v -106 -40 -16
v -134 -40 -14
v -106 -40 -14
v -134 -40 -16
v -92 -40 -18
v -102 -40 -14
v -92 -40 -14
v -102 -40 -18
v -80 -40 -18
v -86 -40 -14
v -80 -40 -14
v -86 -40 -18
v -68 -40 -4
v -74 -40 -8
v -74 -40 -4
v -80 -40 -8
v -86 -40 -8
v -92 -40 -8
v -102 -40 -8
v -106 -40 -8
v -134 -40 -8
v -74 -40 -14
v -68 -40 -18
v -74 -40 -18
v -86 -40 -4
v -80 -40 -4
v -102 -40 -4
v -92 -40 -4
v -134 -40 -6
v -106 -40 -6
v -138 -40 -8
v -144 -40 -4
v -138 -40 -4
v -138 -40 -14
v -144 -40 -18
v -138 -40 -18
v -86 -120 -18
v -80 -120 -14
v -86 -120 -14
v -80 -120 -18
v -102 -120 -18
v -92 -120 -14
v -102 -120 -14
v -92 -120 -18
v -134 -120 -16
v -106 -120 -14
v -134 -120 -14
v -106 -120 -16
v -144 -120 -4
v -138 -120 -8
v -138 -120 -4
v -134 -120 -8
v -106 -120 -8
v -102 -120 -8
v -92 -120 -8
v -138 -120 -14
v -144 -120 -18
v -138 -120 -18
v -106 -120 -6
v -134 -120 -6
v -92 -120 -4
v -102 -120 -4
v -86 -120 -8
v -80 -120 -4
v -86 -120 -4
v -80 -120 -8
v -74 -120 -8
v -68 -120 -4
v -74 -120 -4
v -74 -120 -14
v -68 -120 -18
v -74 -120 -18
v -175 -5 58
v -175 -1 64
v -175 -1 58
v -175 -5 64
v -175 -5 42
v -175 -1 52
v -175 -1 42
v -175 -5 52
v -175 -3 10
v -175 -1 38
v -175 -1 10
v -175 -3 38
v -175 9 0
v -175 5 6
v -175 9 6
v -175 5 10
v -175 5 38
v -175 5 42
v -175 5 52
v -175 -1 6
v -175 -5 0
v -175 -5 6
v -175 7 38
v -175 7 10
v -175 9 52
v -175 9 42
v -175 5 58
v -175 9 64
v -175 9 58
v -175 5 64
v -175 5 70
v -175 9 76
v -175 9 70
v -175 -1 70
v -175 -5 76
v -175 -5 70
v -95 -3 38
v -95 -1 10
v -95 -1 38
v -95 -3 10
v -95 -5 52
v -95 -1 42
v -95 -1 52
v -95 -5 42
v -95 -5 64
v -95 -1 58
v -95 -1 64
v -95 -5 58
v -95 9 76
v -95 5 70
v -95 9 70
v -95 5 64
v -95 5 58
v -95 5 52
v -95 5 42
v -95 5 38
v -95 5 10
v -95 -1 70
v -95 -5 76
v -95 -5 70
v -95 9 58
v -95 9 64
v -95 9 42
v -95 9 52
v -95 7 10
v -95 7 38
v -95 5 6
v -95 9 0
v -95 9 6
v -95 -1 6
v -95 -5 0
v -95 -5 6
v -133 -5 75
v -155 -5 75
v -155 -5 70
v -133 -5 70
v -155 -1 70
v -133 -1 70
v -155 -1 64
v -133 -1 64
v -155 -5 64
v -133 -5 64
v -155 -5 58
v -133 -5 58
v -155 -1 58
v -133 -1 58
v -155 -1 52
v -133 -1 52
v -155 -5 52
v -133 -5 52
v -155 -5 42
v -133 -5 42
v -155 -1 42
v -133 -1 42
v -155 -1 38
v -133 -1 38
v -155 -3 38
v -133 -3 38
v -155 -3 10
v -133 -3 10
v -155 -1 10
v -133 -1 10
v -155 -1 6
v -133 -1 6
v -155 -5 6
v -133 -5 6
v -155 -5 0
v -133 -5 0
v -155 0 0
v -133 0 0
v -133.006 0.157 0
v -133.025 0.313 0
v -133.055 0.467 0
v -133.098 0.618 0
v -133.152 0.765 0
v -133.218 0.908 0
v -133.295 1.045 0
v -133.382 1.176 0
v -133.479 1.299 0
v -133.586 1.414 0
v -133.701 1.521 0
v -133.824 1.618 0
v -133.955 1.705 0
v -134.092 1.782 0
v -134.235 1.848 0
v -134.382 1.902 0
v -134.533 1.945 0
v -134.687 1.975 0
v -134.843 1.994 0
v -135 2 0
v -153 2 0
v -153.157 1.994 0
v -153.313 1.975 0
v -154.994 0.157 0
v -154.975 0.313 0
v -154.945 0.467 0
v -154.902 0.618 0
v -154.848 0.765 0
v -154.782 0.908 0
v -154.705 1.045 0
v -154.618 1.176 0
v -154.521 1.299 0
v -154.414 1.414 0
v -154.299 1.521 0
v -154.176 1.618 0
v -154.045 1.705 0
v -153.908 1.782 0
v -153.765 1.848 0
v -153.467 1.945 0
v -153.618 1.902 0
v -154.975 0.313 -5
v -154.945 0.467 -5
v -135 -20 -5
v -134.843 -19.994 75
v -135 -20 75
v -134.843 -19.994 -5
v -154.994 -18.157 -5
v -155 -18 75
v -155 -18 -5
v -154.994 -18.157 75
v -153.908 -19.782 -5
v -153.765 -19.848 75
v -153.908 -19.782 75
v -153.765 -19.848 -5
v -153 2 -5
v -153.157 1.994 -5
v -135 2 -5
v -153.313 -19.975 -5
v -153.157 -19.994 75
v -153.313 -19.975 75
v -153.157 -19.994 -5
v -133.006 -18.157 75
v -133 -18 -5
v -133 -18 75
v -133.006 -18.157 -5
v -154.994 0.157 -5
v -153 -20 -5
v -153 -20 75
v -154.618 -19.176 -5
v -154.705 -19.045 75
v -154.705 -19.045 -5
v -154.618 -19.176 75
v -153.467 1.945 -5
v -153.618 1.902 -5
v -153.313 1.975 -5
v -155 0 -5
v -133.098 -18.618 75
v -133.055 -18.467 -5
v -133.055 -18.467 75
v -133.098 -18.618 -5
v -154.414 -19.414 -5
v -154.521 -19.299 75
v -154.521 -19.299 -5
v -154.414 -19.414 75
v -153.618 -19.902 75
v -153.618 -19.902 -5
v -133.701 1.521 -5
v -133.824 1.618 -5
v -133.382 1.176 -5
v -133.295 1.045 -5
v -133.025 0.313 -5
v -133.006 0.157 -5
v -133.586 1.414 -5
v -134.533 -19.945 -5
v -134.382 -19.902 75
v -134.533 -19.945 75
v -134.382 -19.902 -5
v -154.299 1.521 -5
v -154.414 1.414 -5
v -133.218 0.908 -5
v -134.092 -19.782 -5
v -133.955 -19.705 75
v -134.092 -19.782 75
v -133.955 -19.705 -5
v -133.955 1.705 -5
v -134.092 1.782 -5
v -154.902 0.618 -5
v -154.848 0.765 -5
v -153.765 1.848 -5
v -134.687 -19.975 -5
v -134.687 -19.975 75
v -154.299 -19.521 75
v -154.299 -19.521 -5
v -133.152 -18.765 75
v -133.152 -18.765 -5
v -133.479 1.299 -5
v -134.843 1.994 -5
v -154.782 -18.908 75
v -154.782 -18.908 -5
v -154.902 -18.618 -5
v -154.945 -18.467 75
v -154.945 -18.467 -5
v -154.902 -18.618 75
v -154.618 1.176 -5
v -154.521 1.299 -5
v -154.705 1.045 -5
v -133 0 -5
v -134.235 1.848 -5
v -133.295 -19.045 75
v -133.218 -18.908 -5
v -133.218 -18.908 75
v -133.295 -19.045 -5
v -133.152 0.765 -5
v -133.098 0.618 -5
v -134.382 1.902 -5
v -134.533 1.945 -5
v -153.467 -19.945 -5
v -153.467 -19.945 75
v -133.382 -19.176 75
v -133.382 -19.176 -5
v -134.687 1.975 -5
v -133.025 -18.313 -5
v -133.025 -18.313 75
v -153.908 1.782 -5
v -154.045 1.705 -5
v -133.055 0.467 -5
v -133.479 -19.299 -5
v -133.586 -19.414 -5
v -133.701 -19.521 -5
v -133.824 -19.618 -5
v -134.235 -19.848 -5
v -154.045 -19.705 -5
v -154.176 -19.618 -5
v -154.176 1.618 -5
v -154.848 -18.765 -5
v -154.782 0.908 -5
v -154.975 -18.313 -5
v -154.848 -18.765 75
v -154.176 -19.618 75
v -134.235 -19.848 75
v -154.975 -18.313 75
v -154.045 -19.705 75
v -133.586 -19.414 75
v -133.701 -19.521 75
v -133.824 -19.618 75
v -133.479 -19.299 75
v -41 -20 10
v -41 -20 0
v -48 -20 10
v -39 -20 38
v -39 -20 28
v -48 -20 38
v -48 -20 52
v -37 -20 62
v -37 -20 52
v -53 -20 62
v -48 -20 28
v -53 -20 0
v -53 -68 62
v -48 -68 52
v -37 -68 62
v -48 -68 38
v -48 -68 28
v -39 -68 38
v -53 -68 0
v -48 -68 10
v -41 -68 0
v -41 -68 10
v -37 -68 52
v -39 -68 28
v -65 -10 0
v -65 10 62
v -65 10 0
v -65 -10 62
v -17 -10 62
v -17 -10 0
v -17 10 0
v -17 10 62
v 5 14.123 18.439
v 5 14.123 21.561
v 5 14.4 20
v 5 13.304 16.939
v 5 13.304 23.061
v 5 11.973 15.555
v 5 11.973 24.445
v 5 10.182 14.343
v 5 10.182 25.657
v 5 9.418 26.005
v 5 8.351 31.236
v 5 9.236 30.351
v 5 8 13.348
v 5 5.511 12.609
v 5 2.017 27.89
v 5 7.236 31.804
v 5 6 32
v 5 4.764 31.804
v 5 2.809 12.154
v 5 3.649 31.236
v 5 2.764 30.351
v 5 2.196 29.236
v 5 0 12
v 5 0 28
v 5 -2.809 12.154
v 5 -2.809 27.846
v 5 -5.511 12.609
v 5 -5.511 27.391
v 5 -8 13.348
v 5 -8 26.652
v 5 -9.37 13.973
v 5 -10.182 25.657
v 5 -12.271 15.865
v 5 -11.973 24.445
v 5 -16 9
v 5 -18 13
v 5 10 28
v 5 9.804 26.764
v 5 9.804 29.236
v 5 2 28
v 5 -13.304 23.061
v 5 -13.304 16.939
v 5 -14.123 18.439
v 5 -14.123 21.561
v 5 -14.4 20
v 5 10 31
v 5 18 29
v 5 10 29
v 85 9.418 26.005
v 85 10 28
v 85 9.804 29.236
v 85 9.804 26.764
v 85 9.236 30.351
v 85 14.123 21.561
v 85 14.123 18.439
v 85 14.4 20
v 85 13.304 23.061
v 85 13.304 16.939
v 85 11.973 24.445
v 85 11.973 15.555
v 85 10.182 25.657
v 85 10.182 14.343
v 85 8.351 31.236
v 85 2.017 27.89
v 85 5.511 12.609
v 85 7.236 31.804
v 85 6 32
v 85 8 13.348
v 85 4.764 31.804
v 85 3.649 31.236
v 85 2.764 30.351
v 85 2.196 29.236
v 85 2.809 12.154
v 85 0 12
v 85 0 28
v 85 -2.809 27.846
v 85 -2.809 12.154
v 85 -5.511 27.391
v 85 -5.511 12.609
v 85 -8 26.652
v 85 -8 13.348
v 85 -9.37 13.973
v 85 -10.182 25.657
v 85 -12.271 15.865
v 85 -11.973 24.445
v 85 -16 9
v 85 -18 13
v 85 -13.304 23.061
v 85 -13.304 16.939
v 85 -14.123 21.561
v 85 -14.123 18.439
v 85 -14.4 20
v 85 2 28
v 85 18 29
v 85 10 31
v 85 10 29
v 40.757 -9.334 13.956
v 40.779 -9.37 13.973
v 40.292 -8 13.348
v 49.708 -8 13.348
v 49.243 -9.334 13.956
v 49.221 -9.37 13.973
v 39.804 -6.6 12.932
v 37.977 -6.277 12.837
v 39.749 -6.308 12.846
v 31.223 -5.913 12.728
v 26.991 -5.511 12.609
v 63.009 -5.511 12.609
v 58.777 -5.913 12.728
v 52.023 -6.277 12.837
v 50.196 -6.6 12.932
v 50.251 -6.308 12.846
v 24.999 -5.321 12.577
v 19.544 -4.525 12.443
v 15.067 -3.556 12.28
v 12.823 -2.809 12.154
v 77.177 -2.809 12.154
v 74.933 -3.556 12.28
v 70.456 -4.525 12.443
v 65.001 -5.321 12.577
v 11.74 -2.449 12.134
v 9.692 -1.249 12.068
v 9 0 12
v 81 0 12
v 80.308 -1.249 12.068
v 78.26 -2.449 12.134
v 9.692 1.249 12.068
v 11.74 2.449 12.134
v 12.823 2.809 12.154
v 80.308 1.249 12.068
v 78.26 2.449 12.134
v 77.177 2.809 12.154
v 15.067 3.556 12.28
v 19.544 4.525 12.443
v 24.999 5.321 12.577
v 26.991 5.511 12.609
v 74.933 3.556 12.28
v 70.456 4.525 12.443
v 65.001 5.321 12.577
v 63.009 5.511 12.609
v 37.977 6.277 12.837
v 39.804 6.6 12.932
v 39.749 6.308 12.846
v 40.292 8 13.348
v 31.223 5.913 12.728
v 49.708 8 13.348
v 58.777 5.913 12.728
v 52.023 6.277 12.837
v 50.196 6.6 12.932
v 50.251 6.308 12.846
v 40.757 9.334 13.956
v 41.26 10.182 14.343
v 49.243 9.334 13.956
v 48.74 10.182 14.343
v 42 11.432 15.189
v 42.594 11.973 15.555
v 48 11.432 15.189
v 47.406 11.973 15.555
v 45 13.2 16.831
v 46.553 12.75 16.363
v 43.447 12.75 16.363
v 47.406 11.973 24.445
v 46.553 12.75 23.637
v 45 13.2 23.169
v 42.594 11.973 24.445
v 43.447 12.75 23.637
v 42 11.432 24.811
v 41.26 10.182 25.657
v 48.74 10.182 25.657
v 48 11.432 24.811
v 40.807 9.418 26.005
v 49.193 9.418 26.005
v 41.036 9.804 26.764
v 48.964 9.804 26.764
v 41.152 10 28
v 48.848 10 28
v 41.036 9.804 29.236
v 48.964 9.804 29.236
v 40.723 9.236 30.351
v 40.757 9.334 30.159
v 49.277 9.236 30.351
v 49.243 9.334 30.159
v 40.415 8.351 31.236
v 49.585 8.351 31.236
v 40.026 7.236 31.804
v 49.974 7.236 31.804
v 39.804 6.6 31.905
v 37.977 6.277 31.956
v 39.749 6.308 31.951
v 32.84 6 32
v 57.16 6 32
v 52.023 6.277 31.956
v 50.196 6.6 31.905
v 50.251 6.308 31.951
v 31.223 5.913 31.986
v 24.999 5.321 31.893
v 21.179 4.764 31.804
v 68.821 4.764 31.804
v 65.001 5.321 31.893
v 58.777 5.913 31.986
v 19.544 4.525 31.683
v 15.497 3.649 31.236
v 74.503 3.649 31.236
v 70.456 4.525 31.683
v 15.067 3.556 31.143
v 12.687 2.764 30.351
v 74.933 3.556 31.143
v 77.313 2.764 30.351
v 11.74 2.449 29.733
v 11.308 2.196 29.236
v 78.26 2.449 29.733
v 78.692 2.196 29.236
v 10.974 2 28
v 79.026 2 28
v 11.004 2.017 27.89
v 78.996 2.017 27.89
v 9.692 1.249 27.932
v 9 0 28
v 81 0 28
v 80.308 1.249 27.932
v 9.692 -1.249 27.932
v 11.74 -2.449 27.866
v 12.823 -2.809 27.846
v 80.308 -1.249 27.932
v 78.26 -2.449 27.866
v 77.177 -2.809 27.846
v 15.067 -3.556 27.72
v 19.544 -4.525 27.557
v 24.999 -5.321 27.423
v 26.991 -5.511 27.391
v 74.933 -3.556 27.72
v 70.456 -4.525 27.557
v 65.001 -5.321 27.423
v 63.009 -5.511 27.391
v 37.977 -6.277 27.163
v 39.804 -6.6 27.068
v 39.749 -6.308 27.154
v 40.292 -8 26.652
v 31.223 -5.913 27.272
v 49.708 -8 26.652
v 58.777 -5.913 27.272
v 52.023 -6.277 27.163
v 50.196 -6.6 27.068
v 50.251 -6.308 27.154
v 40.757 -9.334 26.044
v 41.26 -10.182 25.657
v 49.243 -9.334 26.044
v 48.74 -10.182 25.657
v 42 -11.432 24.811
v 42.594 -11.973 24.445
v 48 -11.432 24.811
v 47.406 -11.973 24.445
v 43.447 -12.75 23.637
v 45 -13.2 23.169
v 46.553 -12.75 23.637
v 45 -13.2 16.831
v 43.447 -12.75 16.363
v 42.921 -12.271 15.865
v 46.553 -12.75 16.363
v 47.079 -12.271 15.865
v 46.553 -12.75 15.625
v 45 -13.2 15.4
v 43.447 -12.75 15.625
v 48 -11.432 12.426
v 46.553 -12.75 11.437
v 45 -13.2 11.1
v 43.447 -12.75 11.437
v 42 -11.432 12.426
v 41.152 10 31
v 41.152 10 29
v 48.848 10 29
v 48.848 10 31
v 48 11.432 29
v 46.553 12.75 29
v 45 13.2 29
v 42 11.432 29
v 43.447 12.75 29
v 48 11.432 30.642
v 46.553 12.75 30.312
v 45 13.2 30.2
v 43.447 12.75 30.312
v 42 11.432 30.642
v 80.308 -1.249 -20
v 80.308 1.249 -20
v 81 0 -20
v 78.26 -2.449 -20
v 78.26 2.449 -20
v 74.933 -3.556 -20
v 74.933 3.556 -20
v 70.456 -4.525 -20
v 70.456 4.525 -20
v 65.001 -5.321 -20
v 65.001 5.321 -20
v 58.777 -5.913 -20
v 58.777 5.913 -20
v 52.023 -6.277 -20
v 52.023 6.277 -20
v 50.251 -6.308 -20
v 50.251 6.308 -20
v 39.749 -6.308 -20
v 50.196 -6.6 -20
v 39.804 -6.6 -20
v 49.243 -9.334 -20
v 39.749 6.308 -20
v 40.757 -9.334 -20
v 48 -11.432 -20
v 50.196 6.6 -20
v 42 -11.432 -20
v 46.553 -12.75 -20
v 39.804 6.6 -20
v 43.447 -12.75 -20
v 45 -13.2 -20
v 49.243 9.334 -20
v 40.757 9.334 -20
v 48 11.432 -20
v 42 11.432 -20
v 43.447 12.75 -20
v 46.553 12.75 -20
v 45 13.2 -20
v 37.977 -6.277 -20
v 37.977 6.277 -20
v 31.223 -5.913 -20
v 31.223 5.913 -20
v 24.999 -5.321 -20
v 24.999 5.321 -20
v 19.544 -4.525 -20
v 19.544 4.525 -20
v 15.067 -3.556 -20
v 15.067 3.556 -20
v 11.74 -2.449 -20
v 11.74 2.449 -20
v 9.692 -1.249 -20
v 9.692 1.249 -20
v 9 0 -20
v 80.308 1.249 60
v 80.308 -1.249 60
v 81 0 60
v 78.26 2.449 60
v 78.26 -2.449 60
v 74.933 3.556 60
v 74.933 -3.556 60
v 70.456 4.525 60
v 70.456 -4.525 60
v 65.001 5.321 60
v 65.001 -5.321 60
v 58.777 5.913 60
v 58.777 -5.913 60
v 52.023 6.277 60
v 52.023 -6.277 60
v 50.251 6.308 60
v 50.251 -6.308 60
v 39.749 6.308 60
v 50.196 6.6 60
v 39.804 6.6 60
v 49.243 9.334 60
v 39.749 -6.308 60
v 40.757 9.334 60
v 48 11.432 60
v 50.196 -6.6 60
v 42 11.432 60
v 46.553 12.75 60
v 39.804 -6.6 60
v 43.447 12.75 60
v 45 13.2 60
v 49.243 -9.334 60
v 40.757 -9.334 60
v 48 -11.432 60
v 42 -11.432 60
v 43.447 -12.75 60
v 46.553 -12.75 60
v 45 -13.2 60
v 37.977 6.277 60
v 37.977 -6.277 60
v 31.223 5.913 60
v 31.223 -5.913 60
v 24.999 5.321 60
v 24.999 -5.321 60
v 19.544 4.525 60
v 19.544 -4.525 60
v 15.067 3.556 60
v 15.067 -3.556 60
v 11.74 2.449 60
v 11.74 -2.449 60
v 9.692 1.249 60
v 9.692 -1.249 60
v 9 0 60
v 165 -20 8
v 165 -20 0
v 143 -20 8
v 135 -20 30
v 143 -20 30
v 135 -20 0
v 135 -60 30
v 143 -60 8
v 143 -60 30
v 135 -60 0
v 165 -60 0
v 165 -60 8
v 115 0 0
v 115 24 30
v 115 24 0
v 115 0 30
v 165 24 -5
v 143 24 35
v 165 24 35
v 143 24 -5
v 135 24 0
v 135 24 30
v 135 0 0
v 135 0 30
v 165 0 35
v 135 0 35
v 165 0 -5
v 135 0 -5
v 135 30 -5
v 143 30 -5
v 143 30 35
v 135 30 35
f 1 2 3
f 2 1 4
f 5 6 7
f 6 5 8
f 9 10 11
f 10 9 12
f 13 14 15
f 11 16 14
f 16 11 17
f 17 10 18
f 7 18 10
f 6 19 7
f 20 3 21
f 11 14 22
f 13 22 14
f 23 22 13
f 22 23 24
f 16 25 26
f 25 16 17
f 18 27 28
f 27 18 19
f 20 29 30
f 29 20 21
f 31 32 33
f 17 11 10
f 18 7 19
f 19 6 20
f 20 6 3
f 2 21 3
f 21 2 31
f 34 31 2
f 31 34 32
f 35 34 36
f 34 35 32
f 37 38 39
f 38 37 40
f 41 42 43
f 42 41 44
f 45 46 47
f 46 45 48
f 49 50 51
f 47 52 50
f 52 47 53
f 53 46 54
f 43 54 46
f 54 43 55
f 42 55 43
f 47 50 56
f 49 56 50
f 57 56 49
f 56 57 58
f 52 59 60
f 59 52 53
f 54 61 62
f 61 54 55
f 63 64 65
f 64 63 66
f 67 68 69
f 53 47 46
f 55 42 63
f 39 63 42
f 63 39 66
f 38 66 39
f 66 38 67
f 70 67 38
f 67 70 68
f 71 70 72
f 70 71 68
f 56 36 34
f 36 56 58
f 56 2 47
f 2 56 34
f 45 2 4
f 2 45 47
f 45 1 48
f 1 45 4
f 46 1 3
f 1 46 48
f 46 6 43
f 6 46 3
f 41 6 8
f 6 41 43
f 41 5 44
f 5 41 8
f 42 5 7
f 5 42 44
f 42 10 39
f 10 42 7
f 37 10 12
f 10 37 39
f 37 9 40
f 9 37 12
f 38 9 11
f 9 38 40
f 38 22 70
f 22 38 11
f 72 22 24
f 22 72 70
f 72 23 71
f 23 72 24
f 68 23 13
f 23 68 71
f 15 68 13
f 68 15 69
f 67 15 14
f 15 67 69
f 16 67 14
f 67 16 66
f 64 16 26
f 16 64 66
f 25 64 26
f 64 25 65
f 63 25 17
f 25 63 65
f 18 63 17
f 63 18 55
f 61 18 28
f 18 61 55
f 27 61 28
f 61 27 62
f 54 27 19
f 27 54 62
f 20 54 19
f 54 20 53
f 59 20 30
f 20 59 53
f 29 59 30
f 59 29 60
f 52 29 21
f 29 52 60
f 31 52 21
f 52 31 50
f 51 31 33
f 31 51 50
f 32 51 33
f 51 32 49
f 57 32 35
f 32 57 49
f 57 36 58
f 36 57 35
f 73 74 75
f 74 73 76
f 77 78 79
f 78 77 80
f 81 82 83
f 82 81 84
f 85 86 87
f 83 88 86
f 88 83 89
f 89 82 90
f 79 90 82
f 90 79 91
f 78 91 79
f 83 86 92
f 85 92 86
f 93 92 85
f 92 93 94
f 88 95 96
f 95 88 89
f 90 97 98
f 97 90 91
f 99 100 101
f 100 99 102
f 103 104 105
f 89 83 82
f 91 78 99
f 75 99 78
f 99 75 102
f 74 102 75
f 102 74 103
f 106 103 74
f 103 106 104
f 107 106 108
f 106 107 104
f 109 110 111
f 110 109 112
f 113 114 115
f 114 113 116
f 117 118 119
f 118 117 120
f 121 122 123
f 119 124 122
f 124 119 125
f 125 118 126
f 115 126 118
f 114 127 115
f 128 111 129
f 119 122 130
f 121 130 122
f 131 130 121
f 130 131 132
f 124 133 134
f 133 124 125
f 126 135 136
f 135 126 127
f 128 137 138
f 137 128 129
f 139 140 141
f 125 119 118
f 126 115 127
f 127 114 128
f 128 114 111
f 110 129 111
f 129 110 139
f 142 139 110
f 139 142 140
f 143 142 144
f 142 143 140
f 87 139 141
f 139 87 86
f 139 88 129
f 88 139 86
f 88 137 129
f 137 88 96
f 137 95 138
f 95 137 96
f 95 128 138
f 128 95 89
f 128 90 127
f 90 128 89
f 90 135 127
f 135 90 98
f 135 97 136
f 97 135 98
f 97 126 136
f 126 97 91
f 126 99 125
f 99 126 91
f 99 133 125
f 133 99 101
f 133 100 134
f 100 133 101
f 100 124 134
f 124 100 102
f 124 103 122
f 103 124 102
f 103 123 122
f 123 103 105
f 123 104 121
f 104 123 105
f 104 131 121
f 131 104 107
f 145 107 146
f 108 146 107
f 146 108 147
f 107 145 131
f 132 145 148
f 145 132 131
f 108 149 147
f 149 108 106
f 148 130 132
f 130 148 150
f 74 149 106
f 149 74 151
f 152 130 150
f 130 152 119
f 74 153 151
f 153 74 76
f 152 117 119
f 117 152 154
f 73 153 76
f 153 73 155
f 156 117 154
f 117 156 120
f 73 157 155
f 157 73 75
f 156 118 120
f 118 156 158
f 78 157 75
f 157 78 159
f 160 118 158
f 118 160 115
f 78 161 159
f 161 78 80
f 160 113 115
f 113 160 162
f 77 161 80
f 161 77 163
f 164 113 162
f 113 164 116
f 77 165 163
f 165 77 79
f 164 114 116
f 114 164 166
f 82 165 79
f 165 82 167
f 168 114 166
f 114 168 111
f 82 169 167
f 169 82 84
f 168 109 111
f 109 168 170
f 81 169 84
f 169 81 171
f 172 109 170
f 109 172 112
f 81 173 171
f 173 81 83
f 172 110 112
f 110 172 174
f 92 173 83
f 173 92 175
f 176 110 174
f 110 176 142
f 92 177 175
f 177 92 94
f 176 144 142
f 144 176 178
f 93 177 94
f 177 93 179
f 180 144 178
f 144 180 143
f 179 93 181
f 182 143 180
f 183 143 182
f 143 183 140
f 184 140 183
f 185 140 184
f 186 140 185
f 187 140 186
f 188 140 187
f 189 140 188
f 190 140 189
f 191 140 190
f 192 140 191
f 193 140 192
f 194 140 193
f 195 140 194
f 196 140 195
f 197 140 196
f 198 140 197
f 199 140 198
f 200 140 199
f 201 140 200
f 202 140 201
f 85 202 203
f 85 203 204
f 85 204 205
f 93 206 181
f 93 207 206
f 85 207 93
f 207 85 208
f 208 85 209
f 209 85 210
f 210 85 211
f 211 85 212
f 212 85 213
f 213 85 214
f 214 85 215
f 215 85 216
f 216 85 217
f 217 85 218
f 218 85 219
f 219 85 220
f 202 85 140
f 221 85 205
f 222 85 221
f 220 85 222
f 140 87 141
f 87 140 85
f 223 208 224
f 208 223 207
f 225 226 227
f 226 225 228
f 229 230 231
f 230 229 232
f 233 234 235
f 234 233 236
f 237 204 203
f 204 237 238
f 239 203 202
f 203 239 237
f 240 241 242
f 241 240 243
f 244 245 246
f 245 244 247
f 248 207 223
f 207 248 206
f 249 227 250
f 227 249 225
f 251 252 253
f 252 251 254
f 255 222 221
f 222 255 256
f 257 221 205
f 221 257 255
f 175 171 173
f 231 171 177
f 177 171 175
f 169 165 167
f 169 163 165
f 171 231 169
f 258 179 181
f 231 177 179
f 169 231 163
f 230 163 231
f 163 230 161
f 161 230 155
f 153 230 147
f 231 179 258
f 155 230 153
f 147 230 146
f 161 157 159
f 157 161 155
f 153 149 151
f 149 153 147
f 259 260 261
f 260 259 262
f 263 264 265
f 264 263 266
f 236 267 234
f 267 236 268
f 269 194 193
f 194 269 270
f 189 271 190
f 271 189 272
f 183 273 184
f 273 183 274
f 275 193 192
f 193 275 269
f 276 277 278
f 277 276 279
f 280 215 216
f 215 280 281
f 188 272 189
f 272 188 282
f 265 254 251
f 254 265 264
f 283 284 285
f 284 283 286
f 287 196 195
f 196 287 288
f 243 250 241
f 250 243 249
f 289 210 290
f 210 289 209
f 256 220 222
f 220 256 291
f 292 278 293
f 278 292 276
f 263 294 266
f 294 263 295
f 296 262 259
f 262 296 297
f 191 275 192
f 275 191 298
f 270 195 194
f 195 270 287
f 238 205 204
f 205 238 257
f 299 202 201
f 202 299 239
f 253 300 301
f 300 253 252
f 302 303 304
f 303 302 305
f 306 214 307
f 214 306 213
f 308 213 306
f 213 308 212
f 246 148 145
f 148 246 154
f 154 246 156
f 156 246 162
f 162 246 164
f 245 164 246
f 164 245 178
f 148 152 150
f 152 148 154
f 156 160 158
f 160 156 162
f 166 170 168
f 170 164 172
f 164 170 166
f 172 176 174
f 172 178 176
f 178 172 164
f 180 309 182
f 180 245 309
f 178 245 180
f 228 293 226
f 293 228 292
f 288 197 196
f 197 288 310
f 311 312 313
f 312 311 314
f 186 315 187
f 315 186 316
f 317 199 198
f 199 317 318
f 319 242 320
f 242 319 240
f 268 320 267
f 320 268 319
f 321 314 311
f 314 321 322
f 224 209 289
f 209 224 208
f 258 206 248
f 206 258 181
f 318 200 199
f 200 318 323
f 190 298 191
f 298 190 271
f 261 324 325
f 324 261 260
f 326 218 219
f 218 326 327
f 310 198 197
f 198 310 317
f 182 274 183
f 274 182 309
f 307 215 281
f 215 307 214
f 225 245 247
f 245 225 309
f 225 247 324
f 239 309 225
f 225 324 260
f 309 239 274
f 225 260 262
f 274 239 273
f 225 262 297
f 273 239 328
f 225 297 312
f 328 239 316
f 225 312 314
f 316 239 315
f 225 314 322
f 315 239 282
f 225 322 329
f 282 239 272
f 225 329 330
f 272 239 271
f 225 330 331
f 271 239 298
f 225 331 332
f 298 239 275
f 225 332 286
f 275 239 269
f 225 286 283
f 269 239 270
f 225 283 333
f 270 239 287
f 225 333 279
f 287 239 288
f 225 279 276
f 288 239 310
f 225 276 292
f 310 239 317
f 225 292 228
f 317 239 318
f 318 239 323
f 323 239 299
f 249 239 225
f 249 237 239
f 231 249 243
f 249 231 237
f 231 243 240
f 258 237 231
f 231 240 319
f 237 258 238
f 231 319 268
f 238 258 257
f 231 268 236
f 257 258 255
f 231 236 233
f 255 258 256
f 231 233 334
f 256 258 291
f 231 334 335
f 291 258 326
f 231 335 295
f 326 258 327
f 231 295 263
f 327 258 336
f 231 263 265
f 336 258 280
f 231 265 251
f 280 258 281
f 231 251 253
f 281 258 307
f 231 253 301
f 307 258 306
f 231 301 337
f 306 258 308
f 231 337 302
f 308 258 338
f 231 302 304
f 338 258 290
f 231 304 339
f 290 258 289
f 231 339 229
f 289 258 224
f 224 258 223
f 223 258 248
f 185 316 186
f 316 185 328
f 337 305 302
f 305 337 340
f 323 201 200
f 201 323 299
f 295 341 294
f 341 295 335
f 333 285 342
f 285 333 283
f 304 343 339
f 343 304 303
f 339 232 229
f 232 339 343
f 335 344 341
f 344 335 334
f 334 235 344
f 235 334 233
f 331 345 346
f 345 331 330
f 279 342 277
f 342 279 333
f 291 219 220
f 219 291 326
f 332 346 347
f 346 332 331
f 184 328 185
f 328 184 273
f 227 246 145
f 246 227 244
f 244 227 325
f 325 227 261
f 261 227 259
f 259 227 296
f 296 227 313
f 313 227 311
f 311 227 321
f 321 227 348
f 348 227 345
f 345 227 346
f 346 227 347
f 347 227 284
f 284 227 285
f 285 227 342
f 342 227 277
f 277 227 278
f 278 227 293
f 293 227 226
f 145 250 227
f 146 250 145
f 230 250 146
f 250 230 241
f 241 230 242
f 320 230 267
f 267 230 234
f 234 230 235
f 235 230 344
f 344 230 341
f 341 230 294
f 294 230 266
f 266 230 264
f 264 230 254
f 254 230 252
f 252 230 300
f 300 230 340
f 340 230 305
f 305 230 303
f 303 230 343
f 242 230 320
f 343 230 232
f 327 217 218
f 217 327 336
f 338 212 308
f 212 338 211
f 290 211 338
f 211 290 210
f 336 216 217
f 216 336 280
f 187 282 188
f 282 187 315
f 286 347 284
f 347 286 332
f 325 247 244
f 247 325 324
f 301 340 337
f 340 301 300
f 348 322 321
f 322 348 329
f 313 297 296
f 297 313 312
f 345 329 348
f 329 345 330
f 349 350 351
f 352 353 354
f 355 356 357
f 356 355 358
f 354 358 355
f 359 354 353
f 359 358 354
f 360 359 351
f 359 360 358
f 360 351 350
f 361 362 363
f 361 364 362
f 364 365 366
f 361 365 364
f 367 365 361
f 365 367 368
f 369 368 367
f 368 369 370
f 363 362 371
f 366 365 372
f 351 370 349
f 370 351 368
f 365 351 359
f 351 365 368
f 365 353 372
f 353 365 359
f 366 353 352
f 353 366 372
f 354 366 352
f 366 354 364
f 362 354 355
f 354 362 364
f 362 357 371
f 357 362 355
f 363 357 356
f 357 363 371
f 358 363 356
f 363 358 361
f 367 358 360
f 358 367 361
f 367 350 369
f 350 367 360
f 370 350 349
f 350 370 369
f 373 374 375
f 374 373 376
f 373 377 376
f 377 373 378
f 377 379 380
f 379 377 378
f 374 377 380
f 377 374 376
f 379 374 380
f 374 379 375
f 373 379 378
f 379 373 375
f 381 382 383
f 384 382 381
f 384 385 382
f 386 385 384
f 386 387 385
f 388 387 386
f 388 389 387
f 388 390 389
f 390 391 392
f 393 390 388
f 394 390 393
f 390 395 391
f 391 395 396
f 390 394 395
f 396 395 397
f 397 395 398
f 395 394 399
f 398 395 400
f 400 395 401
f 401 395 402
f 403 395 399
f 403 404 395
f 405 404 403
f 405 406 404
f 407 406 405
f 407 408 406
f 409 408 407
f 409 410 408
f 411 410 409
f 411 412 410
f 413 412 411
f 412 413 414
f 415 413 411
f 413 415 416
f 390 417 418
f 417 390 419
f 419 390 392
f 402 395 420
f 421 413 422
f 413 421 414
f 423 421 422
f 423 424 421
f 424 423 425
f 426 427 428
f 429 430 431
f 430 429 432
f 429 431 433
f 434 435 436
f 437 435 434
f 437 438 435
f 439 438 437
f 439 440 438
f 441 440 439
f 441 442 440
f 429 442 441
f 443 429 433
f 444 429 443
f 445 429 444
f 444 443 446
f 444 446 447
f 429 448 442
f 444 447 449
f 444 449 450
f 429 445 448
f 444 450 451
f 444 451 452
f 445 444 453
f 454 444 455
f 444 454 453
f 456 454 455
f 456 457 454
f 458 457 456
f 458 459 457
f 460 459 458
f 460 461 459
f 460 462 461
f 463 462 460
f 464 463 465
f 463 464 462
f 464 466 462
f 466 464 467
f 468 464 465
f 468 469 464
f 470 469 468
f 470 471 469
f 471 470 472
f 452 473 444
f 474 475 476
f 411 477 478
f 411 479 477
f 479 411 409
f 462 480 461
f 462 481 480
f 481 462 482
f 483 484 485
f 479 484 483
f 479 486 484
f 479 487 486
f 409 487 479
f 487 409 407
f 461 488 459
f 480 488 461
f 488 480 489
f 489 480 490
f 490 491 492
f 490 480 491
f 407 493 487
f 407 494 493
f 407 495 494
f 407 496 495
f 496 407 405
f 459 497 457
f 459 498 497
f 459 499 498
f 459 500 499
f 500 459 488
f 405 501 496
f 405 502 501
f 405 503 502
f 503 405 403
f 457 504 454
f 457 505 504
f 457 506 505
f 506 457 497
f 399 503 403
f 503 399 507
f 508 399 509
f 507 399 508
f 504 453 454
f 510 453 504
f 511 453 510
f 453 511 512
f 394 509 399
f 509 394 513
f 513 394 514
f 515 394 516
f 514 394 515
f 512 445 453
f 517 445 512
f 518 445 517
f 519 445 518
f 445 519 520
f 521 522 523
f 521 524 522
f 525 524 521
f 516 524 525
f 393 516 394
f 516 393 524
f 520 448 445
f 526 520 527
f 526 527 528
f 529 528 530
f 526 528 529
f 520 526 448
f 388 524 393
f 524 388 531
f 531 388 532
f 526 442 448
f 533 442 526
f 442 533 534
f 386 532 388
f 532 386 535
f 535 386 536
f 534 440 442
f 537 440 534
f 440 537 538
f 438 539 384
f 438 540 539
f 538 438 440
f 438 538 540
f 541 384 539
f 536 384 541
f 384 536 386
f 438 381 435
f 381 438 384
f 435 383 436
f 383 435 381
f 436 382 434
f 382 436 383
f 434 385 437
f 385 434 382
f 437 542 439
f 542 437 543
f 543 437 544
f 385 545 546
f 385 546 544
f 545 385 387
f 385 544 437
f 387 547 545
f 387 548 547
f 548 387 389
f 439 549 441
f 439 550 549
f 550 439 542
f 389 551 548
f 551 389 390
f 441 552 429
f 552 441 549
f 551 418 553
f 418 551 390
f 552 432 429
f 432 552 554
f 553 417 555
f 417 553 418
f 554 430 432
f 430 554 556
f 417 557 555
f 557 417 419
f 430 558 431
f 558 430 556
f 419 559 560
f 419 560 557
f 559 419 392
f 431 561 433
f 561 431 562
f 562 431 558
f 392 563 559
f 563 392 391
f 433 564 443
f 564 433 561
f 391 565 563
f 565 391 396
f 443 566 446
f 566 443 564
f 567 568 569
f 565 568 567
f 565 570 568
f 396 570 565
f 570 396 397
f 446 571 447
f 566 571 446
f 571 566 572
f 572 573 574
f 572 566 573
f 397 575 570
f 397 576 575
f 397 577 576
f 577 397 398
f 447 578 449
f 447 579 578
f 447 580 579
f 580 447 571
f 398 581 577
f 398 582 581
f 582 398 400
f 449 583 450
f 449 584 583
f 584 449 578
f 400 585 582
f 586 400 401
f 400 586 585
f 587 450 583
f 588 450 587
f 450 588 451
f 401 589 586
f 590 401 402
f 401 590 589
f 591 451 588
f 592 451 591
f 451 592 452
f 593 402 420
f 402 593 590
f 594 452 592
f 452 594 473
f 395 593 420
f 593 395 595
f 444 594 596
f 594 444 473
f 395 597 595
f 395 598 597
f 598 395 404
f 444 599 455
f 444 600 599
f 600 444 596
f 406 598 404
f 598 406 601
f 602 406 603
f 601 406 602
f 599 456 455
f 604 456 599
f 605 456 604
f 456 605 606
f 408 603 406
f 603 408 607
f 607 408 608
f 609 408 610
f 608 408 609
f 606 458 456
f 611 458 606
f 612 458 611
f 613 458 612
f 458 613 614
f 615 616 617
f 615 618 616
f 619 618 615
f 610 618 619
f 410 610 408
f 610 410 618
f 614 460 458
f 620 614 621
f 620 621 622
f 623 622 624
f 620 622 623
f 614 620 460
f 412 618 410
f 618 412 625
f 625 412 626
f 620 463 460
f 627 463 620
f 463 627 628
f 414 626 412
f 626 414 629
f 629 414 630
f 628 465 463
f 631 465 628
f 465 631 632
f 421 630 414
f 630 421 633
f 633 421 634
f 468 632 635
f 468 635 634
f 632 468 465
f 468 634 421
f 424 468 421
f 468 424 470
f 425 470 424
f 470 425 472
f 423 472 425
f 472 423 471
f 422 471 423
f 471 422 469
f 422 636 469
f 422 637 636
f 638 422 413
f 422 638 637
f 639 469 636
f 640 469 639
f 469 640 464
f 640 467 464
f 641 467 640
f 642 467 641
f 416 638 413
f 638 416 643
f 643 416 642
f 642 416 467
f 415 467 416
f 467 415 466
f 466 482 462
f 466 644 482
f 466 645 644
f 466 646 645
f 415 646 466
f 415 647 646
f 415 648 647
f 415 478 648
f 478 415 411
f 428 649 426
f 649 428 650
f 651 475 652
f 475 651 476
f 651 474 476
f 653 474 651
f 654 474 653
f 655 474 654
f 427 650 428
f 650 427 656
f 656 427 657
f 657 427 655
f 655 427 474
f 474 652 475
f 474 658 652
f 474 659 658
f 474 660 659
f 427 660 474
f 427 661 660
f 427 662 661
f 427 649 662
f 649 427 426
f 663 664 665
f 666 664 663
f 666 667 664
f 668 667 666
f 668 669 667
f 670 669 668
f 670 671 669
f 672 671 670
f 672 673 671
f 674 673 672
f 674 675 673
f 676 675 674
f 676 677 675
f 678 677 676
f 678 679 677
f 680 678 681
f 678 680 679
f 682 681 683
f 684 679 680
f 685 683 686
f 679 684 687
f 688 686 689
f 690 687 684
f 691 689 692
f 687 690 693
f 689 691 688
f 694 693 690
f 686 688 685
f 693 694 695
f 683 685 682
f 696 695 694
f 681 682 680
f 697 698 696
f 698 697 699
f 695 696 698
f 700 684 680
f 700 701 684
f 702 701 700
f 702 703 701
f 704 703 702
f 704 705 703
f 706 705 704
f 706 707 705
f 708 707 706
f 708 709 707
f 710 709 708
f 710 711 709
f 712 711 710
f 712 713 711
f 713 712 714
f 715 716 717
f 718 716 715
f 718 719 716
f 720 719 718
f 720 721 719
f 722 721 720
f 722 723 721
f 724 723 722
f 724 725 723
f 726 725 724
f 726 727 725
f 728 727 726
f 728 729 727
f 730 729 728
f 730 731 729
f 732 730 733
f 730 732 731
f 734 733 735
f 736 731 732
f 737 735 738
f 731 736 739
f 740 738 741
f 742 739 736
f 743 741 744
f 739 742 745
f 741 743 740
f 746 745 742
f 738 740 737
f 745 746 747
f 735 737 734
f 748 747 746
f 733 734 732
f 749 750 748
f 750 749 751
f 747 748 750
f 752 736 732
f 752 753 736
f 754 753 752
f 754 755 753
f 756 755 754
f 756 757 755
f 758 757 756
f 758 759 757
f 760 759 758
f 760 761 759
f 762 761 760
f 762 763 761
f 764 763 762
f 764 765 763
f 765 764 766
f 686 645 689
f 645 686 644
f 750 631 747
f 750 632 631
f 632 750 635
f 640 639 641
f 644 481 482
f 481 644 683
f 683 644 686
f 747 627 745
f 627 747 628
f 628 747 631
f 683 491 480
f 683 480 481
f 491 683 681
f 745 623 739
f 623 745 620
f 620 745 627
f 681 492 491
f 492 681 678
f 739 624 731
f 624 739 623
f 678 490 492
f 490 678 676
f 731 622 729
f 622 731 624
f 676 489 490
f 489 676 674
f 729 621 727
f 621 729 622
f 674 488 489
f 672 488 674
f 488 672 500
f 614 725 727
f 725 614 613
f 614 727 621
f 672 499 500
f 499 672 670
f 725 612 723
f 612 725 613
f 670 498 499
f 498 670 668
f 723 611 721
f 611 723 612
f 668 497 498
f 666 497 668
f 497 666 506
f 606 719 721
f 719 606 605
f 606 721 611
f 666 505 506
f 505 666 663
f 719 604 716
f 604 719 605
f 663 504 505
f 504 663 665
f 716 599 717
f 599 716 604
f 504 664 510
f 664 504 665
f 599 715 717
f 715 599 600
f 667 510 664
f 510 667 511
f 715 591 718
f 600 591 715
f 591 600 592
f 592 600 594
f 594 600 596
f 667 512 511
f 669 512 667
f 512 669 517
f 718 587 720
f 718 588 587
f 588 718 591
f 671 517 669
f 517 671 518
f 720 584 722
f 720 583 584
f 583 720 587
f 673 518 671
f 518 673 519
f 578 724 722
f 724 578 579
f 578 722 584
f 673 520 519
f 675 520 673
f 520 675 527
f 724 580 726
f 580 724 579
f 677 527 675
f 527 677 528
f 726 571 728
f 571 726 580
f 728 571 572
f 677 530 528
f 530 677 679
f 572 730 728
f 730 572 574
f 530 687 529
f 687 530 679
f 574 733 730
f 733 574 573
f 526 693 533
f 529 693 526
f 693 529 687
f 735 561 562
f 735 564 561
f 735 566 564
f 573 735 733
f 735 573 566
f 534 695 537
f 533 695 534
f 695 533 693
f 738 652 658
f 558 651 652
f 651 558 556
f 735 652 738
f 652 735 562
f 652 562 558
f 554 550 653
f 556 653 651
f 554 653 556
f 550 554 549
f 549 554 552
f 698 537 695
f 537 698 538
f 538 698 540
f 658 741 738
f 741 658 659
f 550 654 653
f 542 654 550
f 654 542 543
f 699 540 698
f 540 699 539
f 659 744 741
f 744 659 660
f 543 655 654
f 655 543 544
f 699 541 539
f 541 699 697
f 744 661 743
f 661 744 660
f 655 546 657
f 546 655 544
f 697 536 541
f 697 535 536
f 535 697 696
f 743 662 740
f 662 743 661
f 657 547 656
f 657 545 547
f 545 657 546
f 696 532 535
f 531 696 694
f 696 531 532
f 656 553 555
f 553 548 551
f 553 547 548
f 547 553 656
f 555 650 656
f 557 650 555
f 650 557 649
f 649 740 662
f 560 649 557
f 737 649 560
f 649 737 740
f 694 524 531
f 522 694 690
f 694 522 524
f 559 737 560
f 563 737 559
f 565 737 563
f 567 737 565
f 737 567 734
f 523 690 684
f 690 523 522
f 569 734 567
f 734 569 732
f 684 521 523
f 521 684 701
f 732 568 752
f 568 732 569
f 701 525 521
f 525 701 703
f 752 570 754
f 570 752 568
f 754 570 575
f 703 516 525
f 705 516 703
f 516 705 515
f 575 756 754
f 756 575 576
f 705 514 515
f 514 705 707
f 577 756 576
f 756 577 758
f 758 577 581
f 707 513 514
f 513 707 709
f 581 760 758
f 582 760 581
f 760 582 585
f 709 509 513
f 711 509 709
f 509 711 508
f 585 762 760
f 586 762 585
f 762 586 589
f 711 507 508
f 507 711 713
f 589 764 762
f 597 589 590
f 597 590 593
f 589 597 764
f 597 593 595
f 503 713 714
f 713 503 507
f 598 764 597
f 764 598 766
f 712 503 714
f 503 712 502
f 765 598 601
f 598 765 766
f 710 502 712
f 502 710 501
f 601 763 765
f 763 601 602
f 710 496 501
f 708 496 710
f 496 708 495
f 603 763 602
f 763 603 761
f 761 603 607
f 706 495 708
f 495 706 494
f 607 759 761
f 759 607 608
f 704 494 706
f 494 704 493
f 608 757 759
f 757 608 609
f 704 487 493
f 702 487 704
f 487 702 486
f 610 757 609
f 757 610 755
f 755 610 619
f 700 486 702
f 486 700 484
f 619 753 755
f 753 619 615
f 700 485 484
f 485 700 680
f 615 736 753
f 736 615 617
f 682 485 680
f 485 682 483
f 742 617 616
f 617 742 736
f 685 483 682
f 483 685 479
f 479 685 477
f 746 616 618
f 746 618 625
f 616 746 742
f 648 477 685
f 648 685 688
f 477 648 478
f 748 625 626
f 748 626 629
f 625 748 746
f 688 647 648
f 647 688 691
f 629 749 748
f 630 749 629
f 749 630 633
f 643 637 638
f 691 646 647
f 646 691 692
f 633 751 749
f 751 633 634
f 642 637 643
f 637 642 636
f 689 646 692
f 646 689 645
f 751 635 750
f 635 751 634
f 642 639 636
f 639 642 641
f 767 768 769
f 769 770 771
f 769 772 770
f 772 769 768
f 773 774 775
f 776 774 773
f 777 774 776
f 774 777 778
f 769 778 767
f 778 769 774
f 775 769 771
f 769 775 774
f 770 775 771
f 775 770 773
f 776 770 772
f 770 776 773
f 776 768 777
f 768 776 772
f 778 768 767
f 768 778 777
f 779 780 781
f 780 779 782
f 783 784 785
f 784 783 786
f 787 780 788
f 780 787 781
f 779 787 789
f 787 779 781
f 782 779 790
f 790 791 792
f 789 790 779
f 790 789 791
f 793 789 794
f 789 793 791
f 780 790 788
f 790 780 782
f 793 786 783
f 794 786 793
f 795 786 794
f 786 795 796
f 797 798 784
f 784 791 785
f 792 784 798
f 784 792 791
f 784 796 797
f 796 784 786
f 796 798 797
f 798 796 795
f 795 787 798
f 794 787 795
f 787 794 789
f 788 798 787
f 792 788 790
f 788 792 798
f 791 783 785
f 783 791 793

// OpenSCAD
// ============================================================
//  PROJECT 09 — 3D Shapes from 2D Shadows
//  Portfolio Project for: Computational CAD Engineer (OpenSCAD)
//  Author: George
// ============================================================
//
//  JD SKILLS DEMONSTRATED:
//  ✔ 3D from 2D Shadows     — CORE TECHNIQUE: intersecting
//                             orthogonal extrusions of 2D silhouettes
//                             reconstructs the 3D solid whose shadows
//                             match all input profiles simultaneously
//  ✔ intersection()         — the boolean that makes it work
//  ✔ linear_extrude         — 2D shadow profiles → 3D slabs
//  ✔ rotate_extrude         — radially symmetric shadow profiles
//  ✔ 2D Objects             — polygon(), circle(), square(), text()
//  ✔ 3D Objects             — cube(), cylinder(), sphere()
//  ✔ Boolean Operations     — intersection(), difference(), union()
//  ✔ Transformations        — translate(), rotate(), mirror(), scale()
//  ✔ Special Variables      — $fn, $fa for resolution
//  ✔ Flow Control           — for loops, if/else, nested conditions
//  ✔ Lists                  — silhouette point data, object configs
//  ✔ List Comprehensions    — multi-view projection generation
//  ✔ Operators              — projection math, coordinate transforms
//  ✔ Modifier Characters    — % ghost views for shadow illustration
//  ✔ Type Test Functions    — is_num(), is_list() validation
//  ✔ Modules & Nesting      — shadow → extrusion → intersection chain
//
// ============================================================
//  THE CORE CONCEPT — "3D FROM 2D SHADOWS":
//
//  Imagine shining a light on a 3D object from three directions:
//  Front, Side, and Top. Each light casts a 2D shadow on the wall.
//  These shadows are the 2D "projections" or "silhouettes".
//
//  This project REVERSES that process:
//  Given the 2D shadows, reconstruct the 3D object.
//
//  METHOD:
//  1. Take the FRONT shadow → extrude it backward (along Y axis)
//     → creates a 3D slab matching the front silhouette
//  2. Take the SIDE shadow  → extrude it sideways (along X axis)
//     → creates a 3D slab matching the side silhouette
//  3. Take the TOP shadow   → extrude it downward (along Z axis)
//     → creates a 3D slab matching the top silhouette
//  4. INTERSECT all three slabs
//     → the overlap is the only region consistent with ALL shadows
//     → this approximates the original 3D object
//
//  This is a fundamental technique in:
//  - Computer vision (3D reconstruction from photos)
//  - CT scanning (medical imaging)
//  - AI training data generation (3D from 2D annotations)
//  - Industrial reverse engineering
// ============================================================
//  HOW TO USE:
//  Set demo_mode to select which object to reconstruct.
//  Set show_shadows = true to visualise the input 2D profiles.
//  F5 = preview, F6 = render
// ============================================================

$fn  = 80;
$fa  = 1;

// ============================================================
//  PARAMETERS
// ============================================================

// Select demo: 1=chess piece, 2=letter F, 3=animal silhouette,
//              4=mechanical bracket, 0=all four side by side
demo_mode         = 0;

// Visual aids
show_shadows      = true;   // show ghost extrusions (% modifier)
show_result       = true;   // show the intersected 3D result
show_axes         = false;  // show XYZ axis reference lines
extrude_depth     = 80;     // mm — depth of each shadow extrusion
                             // must exceed the object's extent

// ============================================================
//  COMPUTED CONSTANTS
// ============================================================
half_depth = extrude_depth / 2;

// ============================================================
//  MODULE: shadow_ghost
//  Renders the extruded shadow slab as a transparent ghost.
//  demonstrates: % modifier character — background/ghost render
//  This visually shows the INPUT to the intersection operation.
// ============================================================
module shadow_ghost(color_rgb) {
    // demonstrates: % modifier — renders transparent/ghost
    // The % modifier makes this visible but non-manifold
    // It shows the shadow slab without affecting the result
    color(color_rgb, 0.12)
    children();
}

// ============================================================
//  MODULE: axis_lines
//  Reference XYZ axes for spatial orientation.
//  demonstrates: for loop, rotate(), cylinder(), color()
// ============================================================
module axis_lines(len = 50) {
    axes = [
        [[1,0,0], [0,1,0], [0,0,1], "X"],  // X — red
        [[0,1,0], [0,0,1], [1,0,0], "Y"],  // Y — green
        [[0,0,1], [1,0,0], [0,1,0], "Z"]   // Z — blue
    ];
    // demonstrates: for loop over list
    for (i = [0 : 2]) {
        color(axes[i][0])
        rotate(i == 0 ? [0,90,0] : i == 1 ? [90,0,0] : [0,0,0])
        cylinder(r = 0.4, h = len, $fn = 8);
    }
}

// ============================================================
//  DEMO 1 — CHESS PIECE (ROOK)
//  Front and side silhouettes are identical (symmetric).
//  Top silhouette is a square with rounded corners.
//
//  demonstrates: intersection() of three extruded profiles,
//               polygon() profiles, rotate_extrude for top,
//               difference() for battlements
// ============================================================

// Front/Side shadow of a rook — stepped profile
module rook_side_profile() {
    // Rook silhouette: base → shaft → battlements
    // demonstrates: polygon() with computed points
    polygon(points = [
        // Right side, bottom to top
        [ 0,  0], [18,  0], [18,  6],   // base
        [14,  6], [14, 10], [16, 10],   // lower step
        [16, 38], [14, 38], [14, 42],   // shaft
        [18, 42], [18, 52],             // battlement base
        [14, 52], [14, 58], [18, 58],   // battlement gap
        [18, 64], [14, 64], [14, 70],   // second battlement
        [18, 70], [18, 76],             // top
        // Left side (mirror), top to bottom
        [ 4, 76], [ 4, 70], [ 8, 70],
        [ 8, 64], [ 4, 64], [ 4, 58],
        [ 8, 58], [ 8, 52], [ 4, 52],
        [ 4, 42], [ 8, 42], [ 8, 38],
        [ 6, 38], [ 6, 10], [ 8, 10],
        [ 8,  6], [ 4,  6], [ 4,  0]
    ]);
}

// Top shadow — square with chamfered corners
module rook_top_profile() {
    // demonstrates: polygon() as top-down silhouette
    offset(r = 2)
    square([18, 18], center = true);
}

module demo_1_rook() {
    // demonstrates: type test validation
    if (!is_num(extrude_depth)) echo("ERROR: extrude_depth must be number");

    // Centre the profile
    cx = -9; cy = -9;

    // ── INTERSECTION OF THREE EXTRUDED SHADOWS ──────────────
    // demonstrates: intersection() — KEY TECHNIQUE
    intersection() {

        // SHADOW 1: Front profile extruded along Y axis
        // demonstrates: linear_extrude — front shadow → 3D slab
        translate([cx, -half_depth, 0])
        rotate([90, 0, 0])
        rotate([0, 0, -90])
        linear_extrude(height = extrude_depth, convexity = 8)
        rook_side_profile();

        // SHADOW 2: Side profile extruded along X axis
        // demonstrates: rotate() + linear_extrude — side shadow
        translate([-half_depth, cy, 0])
        rotate([90, 0, 90])
        linear_extrude(height = extrude_depth, convexity = 8)
        rook_side_profile();

        // SHADOW 3: Top profile extruded along Z axis
        // demonstrates: linear_extrude — top shadow → vertical slab
        translate([cx, cy, -5])
        linear_extrude(height = extrude_depth, convexity = 4)
        rook_top_profile();
    }

    // Ghost shadow visualisation
    // demonstrates: % modifier + shadow_ghost module
    if (show_shadows) {
        // Front shadow ghost
        shadow_ghost([1, 0.3, 0.3])
        translate([cx, -half_depth, 0])
        rotate([90, 0, 0])
        rotate([0, 0, -90])
        linear_extrude(height = extrude_depth, convexity = 8)
        rook_side_profile();

        // Side shadow ghost
        shadow_ghost([0.3, 1, 0.3])
        translate([-half_depth, cy, 0])
        rotate([90, 0, 90])
        linear_extrude(height = extrude_depth, convexity = 8)
        rook_side_profile();

        // Top shadow ghost
        shadow_ghost([0.3, 0.3, 1])
        translate([cx, cy, -5])
        linear_extrude(height = extrude_depth, convexity = 4)
        rook_top_profile();
    }
}

// ============================================================
//  DEMO 2 — LETTER "F" EXTRUSION
//  Front shadow is the letter F.
//  Side and top shadows constrain the depth and height.
//  Result is a 3D letter block.
//
//  demonstrates: polygon() for complex letterform,
//               intersection() giving correct 3D depth,
//               list comprehension for stroke segments
// ============================================================

module letter_F_profile() {
    // Letter F as a 2D polygon
    // demonstrates: polygon() — complex outline
    polygon(points = [
        // Outer boundary — F shape
        [ 0,  0], [12,  0], [12, 10],  // base stem bottom
        [ 5, 10], [ 5, 28], [14, 28],  // mid crossbar
        [14, 38], [ 5, 38], [ 5, 52],  // upper section
        [16, 52], [16, 62],             // top crossbar
        [ 0, 62]                        // back down left side
    ]);
}

// Side profile — rectangular (gives the letter its depth)
module letter_F_side() {
    square([20, 62]);
}

// Top profile — rectangular footprint
module letter_F_top() {
    square([16, 20]);
}

module demo_2_letter_F() {
    cx = -8; cy = -10;

    color([0.85, 0.72, 0.45])
    // demonstrates: intersection() of orthogonal extrusions
    intersection() {
        // Front face — the F letterform
        translate([cx, -half_depth / 2, 0])
        rotate([90, 0, 0])
        linear_extrude(height = extrude_depth * 0.6, convexity = 8)
        letter_F_profile();

        // Side constraint — limits depth
        translate([-half_depth / 2, cy, 0])
        rotate([90, 0, 90])
        linear_extrude(height = extrude_depth * 0.6, convexity = 4)
        letter_F_side();

        // Top constraint — limits footprint
        translate([cx, cy, -5])
        linear_extrude(height = extrude_depth * 0.6, convexity = 4)
        letter_F_top();
    }

    if (show_shadows) {
        shadow_ghost([0.9, 0.5, 0.2])
        translate([cx, -half_depth / 2, 0])
        rotate([90, 0, 0])
        linear_extrude(height = extrude_depth * 0.6, convexity = 8)
        letter_F_profile();

        shadow_ghost([0.2, 0.7, 0.5])
        translate([-half_depth / 2, cy, 0])
        rotate([90, 0, 90])
        linear_extrude(height = extrude_depth * 0.6, convexity = 4)
        letter_F_side();
    }
}

// ============================================================
//  DEMO 3 — ANIMAL SILHOUETTE (BIRD IN FLIGHT)
//  A bird silhouette seen from front, side creates depth.
//  Top view shows wing span.
//
//  demonstrates: polygon() complex organic form,
//               intersection() for organic 3D reconstruction,
//               scale() for aspect ratio adjustment
// ============================================================

// Bird front-view silhouette
module bird_front_profile() {
    // Body + wings spread
    // demonstrates: polygon() organic curved outline
    // (approximated with straight segments for OpenSCAD)
    union() {
        // Body
        scale([1, 1.4, 1])
        circle(r = 8, $fn = 32);

        // Left wing
        polygon(points = [
            [-8,  2], [-14,  8], [-28, 10], [-34,  6],
            [-30,  2], [-18,  0], [ -8, -2]
        ]);

        // Right wing (mirrored)
        // demonstrates: mirror() transformation
        mirror([1, 0, 0])
        polygon(points = [
            [-8,  2], [-14,  8], [-28, 10], [-34,  6],
            [-30,  2], [-18,  0], [ -8, -2]
        ]);

        // Tail
        polygon(points = [
            [-4, -7], [ 4, -7], [ 6, -16], [ 0, -14], [-6, -16]
        ]);

        // Head
        translate([0, 10, 0])
        circle(r = 4.5, $fn = 24);

        // Beak
        translate([4, 12, 0])
        polygon(points = [[0,0],[6,1],[0,2]]);
    }
}

// Bird side silhouette — streamlined body
module bird_side_profile() {
    union() {
        // Body oval
        scale([1.8, 1, 1])
        circle(r = 8, $fn = 32);

        // Head
        translate([6, 8, 0])
        circle(r = 4, $fn = 20);

        // Tail
        translate([-10, -3, 0])
        polygon(points = [[0,0],[-8,-4],[-6,-8],[2,-2]]);

        // Beak
        translate([10, 9, 0])
        polygon(points = [[0,0],[8,0],[0,2]]);
    }
}

// Top view — wing plan form
module bird_top_profile() {
    union() {
        // Body footprint
        scale([1, 2.2, 1])
        circle(r = 6, $fn = 24);

        // Wing plan
        // demonstrates: scale() for elliptical wing shape
        scale([4.5, 0.8, 1])
        circle(r = 8, $fn = 32);
    }
}

module demo_3_bird() {
    color([0.45, 0.55, 0.72])
    translate([0, 0, 20])
    // demonstrates: intersection() for organic 3D reconstruction
    intersection() {
        // Front shadow → extruded slab
        translate([0, -half_depth, 0])
        rotate([90, 0, 0])
        linear_extrude(height = extrude_depth, convexity = 10)
        bird_front_profile();

        // Side shadow → extruded slab
        translate([-half_depth, 0, 0])
        rotate([90, 0, 90])
        linear_extrude(height = extrude_depth, convexity = 10)
        bird_side_profile();

        // Top shadow → extruded slab
        translate([0, 0, -half_depth])
        linear_extrude(height = extrude_depth, convexity = 10)
        bird_top_profile();
    }

    if (show_shadows) {
        translate([0, 0, 20]) {
            shadow_ghost([0.6, 0.3, 0.8])
            translate([0, -half_depth, 0])
            rotate([90, 0, 0])
            linear_extrude(height = extrude_depth, convexity = 10)
            bird_front_profile();

            shadow_ghost([0.3, 0.8, 0.6])
            translate([-half_depth, 0, 0])
            rotate([90, 0, 90])
            linear_extrude(height = extrude_depth, convexity = 10)
            bird_side_profile();

            shadow_ghost([0.8, 0.6, 0.3])
            translate([0, 0, -half_depth])
            linear_extrude(height = extrude_depth, convexity = 10)
            bird_top_profile();
        }
    }
}

// ============================================================
//  DEMO 4 — MECHANICAL BRACKET
//  An L-shaped bracket reconstructed from its three views.
//  Front: L-shape. Side: Rectangle. Top: L footprint.
//
//  demonstrates: intersection() for engineering geometry,
//               polygon() for L-profile, difference() for
//               bolt holes, list comprehension for hole positions
// ============================================================

module bracket_front_profile() {
    // L-shape cross-section
    // demonstrates: union() of two rectangles = L shape
    union() {
        square([30, 8]);         // horizontal arm
        square([8,  30]);        // vertical arm
    }
}

module bracket_side_profile() {
    // Side view — rectangle with gusset triangle
    // demonstrates: union() + polygon() for gusset
    union() {
        square([24, 30]);
        // Triangular gusset for strength
        polygon(points = [
            [0, 8], [24, 8], [0, 30]
        ]);
    }
}

module bracket_top_profile() {
    // Top view — L footprint
    union() {
        square([30, 24]);
        square([8,  30]);
    }
}

module demo_4_bracket() {
    color([0.65, 0.68, 0.72])
    // demonstrates: intersection() for engineering part
    difference() {
        intersection() {
            // Front shadow extrusion
            translate([0, -half_depth * 0.5, 0])
            rotate([90, 0, 0])
            linear_extrude(height = extrude_depth * 0.5, convexity = 6)
            bracket_front_profile();

            // Side shadow extrusion
            translate([-half_depth * 0.5, 0, 0])
            rotate([90, 0, 90])
            linear_extrude(height = extrude_depth * 0.5, convexity = 6)
            bracket_side_profile();

            // Top shadow extrusion
            translate([0, 0, -5])
            linear_extrude(height = extrude_depth * 0.5, convexity = 6)
            bracket_top_profile();
        }

        // Bolt holes — demonstrates: list comprehension for positions
        // demonstrates: list comprehension generating hole coordinates
        bolt_holes = [
            for (pos = [[4,4,0],[4,18,0],[18,4,0],[4,4,20],[4,4,10]])
            pos
        ];

        // demonstrates: for loop + difference() for holes
        for (h = bolt_holes) {
            translate([h[0], h[1], h[2]])
            rotate([h[2] == 0 ? 90 : 0,
                    h[2] != 0 ? 90 : 0, 0])
            cylinder(r = 1.5, h = 20, $fn = 16);
        }

        // Chamfer on outer edges
        // demonstrates: difference() for chamfer detail
        translate([30, -0.1, -0.1])
        rotate([0, -45, 0])
        cube([4, 30, 4]);
    }

    if (show_shadows) {
        shadow_ghost([0.8, 0.4, 0.4])
        translate([0, -half_depth * 0.5, 0])
        rotate([90, 0, 0])
        linear_extrude(height = extrude_depth * 0.5, convexity = 6)
        bracket_front_profile();

        shadow_ghost([0.4, 0.8, 0.4])
        translate([-half_depth * 0.5, 0, 0])
        rotate([90, 0, 90])
        linear_extrude(height = extrude_depth * 0.5, convexity = 6)
        bracket_side_profile();

        shadow_ghost([0.4, 0.4, 0.8])
        translate([0, 0, -5])
        linear_extrude(height = extrude_depth * 0.5, convexity = 6)
        bracket_top_profile();
    }
}

// ============================================================
//  TYPE TEST VALIDATION
//  demonstrates: is_num(), is_list(), is_bool()
// ============================================================
module validate_params() {
    if (!is_num(demo_mode))      echo("ERROR: demo_mode must be a number");
    if (!is_num(extrude_depth))  echo("ERROR: extrude_depth must be a number");
    if (!is_bool(show_shadows))  echo("ERROR: show_shadows must be boolean");
    if (!is_bool(show_result))   echo("ERROR: show_result must be boolean");

    // demonstrates: is_list() on a constructed list
    param_list = [demo_mode, extrude_depth];
    if (is_list(param_list)) {
        echo(str("Parameters validated: demo_mode=",
                 demo_mode, " depth=", extrude_depth));
    }
}

validate_params();

// ============================================================
//  ASSEMBLY — render selected demo or all four
//  demonstrates: if/else flow control, translate()
// ============================================================
module render_demos() {
    spacing = 90;

    // demonstrates: if/else chain selecting demo
    if (demo_mode == 1 || demo_mode == 0) {
        color([0.75, 0.82, 0.88])
        translate(demo_mode == 0 ? [-spacing * 1.5, 0, 0] : [0,0,0])
        demo_1_rook();
    }

    if (demo_mode == 2 || demo_mode == 0) {
        color([0.85, 0.72, 0.45])
        translate(demo_mode == 0 ? [-spacing * 0.5, 0, 0] : [0,0,0])
        demo_2_letter_F();
    }

    if (demo_mode == 3 || demo_mode == 0) {
        translate(demo_mode == 0 ? [spacing * 0.5, 0, 0] : [0,0,0])
        demo_3_bird();
    }

    if (demo_mode == 4 || demo_mode == 0) {
        color([0.65, 0.68, 0.72])
        translate(demo_mode == 0 ? [spacing * 1.5, 0, 0] : [0,0,0])
        demo_4_bracket();
    }

    if (show_axes) {
        axis_lines(60);
    }
}

// --- RENDER ---
render_demos();

// ============================================================
//  QUICK DEMOS — uncomment to study the core technique:
//
//  The simplest possible shadow intersection (sphere):
//  intersection() {
//    translate([0,-40,0]) rotate([90,0,0])
//      linear_extrude(80) circle(r=15);      // front circle
//    translate([-40,0,0]) rotate([90,0,90])
//      linear_extrude(80) circle(r=15);      // side circle
//    translate([0,0,-40])
//      linear_extrude(80) circle(r=15);      // top circle
//  }
//  // Result: approximates a sphere from three circles
//
//  Just the rook:
//  demo_1_rook();
//
//  Just the bracket:
//  demo_4_bracket();
//
//  Front shadow only (no intersection):
//  translate([0,-40,0]) rotate([90,0,0])
//  linear_extrude(80) rook_side_profile();
//
//  All 2D profiles flat (F5 preview):
//  rook_side_profile();
//  translate([25,0]) letter_F_profile();
//  translate([50,0]) bird_front_profile();
// ============================================================

// ============================================================
//  END OF PROJECT 09
//  Core technique: intersection() of orthogonally extruded
//  2D silhouettes reconstructs 3D form — "3D from 2D shadows"
//  Four diverse examples: chess piece, letter, organic bird,
//  mechanical bracket — proving versatility of the technique.
// ============================================================
